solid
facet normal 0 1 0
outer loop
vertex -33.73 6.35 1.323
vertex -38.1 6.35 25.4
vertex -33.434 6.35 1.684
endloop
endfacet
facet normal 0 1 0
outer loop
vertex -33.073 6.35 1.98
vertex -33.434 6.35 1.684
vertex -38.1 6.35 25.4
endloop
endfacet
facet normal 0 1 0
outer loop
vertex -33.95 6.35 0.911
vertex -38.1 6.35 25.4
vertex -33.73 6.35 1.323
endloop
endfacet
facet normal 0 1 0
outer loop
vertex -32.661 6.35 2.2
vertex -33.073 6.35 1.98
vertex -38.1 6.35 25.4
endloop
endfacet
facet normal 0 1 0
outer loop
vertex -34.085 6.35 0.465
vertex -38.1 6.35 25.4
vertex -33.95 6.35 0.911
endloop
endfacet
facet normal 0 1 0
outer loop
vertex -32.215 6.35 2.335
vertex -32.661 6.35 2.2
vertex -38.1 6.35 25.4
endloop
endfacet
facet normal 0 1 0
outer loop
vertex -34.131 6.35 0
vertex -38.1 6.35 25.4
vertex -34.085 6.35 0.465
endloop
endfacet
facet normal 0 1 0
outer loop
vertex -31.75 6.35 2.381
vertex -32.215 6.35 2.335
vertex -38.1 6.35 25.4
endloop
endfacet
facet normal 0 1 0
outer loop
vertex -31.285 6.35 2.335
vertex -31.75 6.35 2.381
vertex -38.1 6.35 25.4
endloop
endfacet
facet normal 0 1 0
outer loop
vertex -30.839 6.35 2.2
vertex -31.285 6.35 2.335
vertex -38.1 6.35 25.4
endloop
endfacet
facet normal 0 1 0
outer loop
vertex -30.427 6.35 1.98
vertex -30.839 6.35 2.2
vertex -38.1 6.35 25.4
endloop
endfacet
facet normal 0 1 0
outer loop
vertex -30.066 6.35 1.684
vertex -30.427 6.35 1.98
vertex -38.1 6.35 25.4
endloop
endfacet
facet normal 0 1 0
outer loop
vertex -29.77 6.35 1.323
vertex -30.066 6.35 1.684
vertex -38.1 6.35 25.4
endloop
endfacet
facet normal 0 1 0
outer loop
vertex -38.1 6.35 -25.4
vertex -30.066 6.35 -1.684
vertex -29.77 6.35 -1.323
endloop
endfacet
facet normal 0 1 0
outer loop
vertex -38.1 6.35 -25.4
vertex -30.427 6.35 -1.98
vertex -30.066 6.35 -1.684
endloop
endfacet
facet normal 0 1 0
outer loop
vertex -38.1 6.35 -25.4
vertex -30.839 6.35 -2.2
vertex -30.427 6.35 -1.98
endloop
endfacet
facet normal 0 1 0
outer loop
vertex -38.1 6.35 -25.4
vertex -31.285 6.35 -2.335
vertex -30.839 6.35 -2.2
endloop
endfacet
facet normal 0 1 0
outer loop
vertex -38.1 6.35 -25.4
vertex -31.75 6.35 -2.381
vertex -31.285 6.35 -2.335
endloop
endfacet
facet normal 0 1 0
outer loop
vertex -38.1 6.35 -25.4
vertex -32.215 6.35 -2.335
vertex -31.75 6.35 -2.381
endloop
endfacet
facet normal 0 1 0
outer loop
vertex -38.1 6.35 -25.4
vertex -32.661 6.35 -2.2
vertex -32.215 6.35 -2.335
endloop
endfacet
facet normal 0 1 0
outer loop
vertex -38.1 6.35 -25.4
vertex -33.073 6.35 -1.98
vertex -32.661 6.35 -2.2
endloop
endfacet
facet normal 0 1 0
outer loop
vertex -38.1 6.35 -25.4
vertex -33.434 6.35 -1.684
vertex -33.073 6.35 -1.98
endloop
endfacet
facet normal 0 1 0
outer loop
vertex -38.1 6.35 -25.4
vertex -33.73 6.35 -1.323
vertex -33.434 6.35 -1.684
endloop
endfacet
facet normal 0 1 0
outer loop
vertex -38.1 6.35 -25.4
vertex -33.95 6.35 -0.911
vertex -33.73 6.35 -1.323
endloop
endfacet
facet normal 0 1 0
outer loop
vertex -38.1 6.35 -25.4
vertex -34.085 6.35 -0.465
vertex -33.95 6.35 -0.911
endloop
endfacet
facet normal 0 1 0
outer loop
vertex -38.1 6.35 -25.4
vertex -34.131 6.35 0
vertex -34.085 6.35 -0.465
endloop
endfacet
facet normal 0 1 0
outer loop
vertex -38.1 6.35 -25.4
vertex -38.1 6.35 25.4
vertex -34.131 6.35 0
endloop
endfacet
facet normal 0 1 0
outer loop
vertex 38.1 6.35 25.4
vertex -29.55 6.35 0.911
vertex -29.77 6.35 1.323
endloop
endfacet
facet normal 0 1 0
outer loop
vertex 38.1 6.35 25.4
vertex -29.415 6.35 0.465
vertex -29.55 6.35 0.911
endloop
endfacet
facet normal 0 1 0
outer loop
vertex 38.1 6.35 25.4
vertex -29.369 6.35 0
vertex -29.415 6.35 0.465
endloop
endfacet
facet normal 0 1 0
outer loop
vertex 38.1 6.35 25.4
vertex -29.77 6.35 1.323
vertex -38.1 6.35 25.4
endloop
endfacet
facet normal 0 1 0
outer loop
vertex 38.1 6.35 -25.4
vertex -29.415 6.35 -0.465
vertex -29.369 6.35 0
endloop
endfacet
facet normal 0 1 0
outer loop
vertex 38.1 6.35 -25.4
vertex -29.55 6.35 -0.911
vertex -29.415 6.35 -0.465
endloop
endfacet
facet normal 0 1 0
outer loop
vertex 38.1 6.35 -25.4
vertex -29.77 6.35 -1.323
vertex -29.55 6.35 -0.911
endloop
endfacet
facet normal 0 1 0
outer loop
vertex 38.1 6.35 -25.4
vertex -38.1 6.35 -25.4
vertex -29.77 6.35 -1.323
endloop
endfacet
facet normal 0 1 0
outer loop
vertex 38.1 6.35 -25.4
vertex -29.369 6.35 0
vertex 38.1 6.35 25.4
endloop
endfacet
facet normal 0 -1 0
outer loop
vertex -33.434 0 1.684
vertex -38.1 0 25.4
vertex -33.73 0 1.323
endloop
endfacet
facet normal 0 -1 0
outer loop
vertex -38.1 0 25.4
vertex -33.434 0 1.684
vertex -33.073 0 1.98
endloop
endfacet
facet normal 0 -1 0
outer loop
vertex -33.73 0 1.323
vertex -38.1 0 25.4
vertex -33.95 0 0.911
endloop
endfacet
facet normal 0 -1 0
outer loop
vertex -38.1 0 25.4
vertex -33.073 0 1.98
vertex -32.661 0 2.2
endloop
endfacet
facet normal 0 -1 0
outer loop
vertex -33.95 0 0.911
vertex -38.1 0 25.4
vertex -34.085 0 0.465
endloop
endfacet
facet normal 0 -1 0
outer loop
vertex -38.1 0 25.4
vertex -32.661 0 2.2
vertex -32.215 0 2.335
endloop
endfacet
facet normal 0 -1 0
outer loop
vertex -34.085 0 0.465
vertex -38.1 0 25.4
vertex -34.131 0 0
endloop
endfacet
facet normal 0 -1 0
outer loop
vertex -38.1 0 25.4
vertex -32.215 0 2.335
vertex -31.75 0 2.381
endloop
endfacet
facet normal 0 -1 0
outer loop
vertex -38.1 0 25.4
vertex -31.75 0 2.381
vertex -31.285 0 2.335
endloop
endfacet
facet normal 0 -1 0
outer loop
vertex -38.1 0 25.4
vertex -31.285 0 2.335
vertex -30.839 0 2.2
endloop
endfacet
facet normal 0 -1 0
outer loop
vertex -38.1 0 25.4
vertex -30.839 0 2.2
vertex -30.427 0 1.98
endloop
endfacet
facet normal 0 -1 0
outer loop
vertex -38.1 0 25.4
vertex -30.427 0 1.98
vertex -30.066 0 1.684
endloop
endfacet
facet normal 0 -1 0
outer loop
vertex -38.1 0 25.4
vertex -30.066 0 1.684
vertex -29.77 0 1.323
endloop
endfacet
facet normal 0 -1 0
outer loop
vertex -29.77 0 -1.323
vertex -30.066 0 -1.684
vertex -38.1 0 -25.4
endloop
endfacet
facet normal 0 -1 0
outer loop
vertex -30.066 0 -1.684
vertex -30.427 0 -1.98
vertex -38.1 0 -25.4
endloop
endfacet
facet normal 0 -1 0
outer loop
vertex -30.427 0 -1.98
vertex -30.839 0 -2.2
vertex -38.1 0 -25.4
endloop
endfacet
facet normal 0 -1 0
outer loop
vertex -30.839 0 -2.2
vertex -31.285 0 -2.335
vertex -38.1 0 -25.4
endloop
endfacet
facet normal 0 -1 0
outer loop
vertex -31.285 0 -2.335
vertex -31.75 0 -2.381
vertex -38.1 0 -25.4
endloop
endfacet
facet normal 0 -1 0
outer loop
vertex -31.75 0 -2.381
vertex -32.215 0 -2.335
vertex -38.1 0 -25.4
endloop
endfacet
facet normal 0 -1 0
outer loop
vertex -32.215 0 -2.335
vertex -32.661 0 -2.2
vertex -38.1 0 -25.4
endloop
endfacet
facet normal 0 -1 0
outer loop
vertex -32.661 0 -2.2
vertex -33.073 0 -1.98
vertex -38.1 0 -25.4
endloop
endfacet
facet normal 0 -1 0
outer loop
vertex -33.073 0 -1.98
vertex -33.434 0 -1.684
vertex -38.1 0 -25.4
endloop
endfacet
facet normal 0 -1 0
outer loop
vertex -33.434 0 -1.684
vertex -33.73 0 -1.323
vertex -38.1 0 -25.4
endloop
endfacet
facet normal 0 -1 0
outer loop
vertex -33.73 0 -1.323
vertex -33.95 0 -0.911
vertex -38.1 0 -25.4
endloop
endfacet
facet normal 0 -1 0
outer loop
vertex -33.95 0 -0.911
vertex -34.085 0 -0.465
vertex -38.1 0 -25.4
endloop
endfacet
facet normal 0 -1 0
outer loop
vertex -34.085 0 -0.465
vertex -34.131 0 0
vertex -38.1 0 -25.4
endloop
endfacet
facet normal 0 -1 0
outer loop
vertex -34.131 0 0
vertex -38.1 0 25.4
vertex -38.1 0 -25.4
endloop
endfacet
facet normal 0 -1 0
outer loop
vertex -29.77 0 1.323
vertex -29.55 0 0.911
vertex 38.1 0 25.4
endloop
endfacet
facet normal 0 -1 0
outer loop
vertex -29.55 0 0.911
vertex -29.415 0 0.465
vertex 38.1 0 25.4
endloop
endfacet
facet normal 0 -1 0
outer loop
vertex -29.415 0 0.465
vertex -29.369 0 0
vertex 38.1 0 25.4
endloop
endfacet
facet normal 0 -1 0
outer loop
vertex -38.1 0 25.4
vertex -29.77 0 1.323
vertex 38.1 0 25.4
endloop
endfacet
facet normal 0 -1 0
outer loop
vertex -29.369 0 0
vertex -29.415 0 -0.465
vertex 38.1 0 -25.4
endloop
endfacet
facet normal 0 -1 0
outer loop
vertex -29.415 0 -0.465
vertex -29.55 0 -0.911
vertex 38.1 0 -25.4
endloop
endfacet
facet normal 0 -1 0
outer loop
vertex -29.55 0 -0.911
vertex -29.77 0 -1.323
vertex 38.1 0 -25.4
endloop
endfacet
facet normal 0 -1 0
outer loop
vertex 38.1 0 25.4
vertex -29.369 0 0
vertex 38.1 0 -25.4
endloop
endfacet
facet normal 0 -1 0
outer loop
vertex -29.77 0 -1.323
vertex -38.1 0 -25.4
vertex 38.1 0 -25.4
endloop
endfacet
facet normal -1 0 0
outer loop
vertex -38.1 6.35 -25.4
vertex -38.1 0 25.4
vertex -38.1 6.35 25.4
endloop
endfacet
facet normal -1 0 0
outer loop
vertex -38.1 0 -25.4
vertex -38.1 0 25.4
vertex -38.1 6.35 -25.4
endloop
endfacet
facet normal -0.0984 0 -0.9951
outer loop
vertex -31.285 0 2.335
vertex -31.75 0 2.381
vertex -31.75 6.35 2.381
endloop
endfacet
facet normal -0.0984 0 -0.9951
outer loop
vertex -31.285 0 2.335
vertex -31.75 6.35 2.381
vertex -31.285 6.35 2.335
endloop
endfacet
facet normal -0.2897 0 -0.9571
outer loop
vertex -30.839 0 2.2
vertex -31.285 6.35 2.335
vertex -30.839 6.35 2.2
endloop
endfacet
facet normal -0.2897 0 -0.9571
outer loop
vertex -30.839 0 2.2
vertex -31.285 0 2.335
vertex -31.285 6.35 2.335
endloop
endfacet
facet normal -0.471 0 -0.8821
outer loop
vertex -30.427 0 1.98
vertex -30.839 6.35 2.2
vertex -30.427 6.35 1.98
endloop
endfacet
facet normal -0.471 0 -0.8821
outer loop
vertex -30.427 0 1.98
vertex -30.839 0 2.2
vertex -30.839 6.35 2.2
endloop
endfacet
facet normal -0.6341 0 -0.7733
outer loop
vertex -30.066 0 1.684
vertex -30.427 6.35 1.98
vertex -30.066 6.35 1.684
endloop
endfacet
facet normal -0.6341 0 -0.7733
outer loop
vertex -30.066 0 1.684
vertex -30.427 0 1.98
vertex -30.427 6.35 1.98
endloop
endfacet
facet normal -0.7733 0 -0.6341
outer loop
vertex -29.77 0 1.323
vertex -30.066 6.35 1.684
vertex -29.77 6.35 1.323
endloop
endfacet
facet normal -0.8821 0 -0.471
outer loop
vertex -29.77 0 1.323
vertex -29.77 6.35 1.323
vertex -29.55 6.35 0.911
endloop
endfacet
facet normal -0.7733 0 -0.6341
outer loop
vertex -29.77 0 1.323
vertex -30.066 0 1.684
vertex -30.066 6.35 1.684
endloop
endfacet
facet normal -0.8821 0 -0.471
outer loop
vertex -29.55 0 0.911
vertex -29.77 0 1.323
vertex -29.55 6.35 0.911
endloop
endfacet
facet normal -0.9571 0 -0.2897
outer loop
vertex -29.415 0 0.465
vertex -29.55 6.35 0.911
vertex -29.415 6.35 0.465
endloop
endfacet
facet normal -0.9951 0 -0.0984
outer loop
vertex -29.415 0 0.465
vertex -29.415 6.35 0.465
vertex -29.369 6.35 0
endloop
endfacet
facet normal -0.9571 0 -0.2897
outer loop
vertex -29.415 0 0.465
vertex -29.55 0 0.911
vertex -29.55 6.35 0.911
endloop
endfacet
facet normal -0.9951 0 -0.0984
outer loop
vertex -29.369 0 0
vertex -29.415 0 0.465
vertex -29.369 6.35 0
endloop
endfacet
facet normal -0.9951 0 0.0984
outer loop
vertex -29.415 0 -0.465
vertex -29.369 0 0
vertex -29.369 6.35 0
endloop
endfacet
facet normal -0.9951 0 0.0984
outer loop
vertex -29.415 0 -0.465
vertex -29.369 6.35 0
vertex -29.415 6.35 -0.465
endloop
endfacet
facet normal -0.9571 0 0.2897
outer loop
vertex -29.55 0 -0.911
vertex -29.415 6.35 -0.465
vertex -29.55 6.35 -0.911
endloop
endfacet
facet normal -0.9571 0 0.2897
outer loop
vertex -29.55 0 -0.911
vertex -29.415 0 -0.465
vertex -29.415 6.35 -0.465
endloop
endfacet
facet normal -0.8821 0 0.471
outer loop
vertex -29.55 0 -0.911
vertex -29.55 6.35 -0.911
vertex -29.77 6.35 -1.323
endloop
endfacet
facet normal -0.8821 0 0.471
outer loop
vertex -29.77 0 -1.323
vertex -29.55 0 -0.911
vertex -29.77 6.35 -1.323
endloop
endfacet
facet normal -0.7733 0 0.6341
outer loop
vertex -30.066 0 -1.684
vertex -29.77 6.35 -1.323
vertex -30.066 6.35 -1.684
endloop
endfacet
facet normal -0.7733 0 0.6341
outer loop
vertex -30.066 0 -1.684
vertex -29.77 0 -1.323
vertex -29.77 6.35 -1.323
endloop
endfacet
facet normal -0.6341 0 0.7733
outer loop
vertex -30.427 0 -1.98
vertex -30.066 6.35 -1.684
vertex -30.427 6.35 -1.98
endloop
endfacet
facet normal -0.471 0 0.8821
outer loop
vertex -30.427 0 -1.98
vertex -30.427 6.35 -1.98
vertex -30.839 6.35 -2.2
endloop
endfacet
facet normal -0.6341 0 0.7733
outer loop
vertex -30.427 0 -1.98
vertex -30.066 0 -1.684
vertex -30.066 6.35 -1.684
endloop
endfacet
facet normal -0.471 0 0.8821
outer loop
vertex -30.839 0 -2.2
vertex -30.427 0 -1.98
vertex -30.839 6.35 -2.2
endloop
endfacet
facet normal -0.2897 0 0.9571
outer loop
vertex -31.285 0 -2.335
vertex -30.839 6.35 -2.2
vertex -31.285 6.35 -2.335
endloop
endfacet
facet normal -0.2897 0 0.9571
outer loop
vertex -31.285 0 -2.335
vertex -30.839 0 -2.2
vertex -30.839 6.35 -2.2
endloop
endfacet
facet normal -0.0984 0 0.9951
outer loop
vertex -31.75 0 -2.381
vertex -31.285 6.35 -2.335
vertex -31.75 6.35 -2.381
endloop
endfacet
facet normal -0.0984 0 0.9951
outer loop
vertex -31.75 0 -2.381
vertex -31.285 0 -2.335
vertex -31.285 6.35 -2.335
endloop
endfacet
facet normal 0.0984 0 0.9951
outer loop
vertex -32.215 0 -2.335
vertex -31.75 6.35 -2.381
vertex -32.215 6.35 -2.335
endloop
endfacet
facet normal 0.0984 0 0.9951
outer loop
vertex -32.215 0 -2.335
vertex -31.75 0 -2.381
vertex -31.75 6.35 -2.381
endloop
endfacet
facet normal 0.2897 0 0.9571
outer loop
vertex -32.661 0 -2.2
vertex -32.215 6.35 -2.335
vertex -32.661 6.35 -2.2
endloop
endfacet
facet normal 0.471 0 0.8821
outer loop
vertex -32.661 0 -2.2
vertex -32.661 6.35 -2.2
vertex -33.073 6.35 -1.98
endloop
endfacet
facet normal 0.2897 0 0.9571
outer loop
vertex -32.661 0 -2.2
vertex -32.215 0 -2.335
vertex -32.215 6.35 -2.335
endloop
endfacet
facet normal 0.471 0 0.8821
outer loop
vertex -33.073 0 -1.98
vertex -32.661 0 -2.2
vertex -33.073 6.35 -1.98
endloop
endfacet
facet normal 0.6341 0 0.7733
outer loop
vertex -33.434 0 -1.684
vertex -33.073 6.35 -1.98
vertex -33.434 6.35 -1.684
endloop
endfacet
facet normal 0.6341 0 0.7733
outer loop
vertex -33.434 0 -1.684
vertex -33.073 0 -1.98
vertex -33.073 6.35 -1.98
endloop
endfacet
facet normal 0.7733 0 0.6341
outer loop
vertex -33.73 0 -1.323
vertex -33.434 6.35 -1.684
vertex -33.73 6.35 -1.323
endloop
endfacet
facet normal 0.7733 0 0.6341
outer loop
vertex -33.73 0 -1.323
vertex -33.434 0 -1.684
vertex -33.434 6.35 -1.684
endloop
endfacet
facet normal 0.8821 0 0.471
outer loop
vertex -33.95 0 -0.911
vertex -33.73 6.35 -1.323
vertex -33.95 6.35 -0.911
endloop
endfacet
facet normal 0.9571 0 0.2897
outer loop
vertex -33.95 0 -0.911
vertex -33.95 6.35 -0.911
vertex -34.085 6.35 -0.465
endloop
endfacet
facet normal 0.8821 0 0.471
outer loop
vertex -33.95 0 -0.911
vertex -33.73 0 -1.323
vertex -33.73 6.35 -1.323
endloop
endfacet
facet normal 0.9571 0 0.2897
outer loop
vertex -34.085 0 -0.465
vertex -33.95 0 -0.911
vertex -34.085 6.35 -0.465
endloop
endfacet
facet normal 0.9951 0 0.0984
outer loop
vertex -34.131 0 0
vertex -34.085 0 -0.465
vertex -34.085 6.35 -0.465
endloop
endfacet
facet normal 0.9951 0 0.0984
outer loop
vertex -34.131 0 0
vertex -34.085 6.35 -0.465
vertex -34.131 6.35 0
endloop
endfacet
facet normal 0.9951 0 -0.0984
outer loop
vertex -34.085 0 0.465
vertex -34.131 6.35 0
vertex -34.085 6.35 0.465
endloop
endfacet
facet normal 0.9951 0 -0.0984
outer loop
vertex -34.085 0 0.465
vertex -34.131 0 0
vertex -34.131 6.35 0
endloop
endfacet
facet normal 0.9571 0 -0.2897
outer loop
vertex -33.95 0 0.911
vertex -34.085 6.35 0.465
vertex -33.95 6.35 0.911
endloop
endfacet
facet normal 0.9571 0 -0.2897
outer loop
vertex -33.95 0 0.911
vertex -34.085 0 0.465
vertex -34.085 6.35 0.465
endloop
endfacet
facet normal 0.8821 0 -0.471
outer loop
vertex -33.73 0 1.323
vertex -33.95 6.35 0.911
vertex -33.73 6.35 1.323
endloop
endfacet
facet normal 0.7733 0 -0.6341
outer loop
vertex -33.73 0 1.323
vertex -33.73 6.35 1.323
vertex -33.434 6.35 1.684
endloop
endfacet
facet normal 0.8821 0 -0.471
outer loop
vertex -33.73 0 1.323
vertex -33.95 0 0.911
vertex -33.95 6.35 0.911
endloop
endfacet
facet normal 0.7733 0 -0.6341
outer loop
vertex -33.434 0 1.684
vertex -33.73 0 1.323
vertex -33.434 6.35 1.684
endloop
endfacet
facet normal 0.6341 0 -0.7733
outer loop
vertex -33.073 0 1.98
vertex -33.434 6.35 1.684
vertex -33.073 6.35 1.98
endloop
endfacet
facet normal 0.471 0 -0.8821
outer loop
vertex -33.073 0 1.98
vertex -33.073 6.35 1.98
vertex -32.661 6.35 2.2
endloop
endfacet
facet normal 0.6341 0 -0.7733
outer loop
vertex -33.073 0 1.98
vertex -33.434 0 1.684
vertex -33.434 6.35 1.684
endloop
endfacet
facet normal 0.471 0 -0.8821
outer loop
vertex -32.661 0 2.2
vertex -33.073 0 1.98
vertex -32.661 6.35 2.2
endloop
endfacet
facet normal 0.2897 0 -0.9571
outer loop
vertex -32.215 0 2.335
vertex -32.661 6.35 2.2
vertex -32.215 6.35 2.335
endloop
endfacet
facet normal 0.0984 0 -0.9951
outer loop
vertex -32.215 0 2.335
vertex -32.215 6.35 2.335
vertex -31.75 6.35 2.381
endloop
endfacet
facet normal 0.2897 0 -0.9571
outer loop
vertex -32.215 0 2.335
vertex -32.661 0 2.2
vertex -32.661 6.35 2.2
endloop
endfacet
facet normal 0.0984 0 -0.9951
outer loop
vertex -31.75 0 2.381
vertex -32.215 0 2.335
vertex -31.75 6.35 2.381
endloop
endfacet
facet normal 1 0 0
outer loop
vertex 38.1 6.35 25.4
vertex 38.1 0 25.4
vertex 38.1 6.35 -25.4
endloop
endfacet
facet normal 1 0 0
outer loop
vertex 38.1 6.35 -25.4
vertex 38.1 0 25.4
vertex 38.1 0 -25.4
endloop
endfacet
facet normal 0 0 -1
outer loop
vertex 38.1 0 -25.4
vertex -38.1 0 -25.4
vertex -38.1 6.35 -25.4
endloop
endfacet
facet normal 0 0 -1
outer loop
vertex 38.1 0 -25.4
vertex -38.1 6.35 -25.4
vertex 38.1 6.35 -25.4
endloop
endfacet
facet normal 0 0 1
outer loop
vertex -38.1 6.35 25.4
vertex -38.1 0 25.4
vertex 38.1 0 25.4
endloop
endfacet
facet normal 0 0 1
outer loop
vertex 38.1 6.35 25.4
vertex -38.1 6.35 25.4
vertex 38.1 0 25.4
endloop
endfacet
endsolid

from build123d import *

# Parameters (mm, degrees)
SKETCH1_W           = 76.2
SKETCH1_H           = 50.8
SKETCH1_R           = 2.38125
BOSS_EXTRUDE1_DEPTH = 6.35


with BuildPart() as part:
    # Sketch1 → Boss-Extrude1 (new body)
    with BuildSketch(Plane(origin=(0, 0, 0), x_dir=(1, 0, 0), z_dir=(0, 1, 0))):
        Rectangle(SKETCH1_W, SKETCH1_H)
        with Locations((-31.75, 0)):
            Circle(SKETCH1_R, mode=Mode.SUBTRACT)
    extrude(amount=BOSS_EXTRUDE1_DEPTH)


solid = part.part
